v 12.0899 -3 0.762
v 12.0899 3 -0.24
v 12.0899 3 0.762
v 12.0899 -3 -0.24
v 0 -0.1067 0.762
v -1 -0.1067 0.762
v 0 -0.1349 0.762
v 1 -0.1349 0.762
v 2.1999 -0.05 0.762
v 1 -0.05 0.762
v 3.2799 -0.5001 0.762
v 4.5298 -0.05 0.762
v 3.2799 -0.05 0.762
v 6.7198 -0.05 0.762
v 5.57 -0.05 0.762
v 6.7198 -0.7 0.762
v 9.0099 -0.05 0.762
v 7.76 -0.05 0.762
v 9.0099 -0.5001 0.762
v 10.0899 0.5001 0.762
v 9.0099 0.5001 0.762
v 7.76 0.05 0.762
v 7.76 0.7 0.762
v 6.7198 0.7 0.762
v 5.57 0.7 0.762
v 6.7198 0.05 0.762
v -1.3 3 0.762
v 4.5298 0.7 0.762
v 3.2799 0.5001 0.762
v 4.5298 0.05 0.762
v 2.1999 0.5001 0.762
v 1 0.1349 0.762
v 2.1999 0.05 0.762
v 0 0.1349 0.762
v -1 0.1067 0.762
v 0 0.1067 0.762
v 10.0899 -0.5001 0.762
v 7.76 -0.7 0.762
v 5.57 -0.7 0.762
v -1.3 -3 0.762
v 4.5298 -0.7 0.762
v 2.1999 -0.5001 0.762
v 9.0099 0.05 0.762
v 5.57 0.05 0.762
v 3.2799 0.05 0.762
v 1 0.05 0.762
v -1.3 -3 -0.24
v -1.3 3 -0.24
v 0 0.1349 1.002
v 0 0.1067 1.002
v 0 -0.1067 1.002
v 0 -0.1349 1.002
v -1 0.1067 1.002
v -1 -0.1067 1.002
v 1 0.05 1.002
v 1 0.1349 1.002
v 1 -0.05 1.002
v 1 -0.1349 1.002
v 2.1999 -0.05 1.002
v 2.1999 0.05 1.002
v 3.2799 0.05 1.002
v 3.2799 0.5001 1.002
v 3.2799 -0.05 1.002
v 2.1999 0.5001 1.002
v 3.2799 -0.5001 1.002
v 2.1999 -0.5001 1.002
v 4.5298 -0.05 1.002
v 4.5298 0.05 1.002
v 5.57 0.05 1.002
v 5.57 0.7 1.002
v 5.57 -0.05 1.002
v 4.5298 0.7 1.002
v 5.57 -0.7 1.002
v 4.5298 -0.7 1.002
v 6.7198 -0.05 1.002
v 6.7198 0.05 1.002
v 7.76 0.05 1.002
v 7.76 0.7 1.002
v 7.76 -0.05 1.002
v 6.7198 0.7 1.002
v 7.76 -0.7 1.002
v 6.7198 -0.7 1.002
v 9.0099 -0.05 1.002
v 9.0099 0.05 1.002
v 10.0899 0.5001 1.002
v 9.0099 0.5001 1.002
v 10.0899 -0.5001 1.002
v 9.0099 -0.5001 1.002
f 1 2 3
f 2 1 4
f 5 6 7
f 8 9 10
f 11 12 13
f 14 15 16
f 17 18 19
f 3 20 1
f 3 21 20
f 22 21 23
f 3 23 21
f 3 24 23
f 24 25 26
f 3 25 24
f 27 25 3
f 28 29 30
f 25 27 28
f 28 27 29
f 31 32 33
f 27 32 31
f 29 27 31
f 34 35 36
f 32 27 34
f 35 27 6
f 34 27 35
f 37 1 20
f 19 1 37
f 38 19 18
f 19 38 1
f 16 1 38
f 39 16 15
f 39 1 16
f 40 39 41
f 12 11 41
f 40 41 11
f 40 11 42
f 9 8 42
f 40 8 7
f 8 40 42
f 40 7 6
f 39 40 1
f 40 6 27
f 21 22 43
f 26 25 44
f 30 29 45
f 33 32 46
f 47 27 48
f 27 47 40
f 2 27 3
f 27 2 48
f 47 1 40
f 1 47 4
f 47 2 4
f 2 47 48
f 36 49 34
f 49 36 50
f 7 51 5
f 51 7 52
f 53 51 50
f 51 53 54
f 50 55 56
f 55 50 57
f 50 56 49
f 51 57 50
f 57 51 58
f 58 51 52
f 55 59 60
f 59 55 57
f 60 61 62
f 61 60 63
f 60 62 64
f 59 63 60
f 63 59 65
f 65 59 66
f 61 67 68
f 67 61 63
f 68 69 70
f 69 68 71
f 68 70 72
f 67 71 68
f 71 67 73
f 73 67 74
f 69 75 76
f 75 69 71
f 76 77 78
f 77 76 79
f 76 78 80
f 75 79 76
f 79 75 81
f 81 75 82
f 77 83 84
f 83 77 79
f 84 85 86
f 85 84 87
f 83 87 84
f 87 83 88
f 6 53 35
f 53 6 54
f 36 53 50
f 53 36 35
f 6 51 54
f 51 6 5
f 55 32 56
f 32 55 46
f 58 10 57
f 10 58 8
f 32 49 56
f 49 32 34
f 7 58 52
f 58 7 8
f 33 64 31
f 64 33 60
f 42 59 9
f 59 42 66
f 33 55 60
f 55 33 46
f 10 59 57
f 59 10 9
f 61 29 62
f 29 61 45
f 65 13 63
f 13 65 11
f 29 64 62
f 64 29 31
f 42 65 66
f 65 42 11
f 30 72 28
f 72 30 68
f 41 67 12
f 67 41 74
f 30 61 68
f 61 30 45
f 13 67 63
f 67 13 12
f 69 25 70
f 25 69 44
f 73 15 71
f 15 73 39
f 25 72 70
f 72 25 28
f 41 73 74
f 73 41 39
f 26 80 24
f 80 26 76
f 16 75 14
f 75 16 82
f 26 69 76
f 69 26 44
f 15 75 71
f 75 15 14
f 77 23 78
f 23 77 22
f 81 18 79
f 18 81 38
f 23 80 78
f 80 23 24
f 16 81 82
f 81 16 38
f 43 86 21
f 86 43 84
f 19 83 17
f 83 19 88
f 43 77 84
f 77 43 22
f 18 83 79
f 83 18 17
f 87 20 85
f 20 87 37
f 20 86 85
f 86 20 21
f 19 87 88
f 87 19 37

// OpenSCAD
// Models of the microstrip patch antennas used in 05 (units: mm).
// Dimensions: TI SWRU553A Table 7 (mil) and RO3003 5 mil stack-up (Fig. 30).
// Render inside the container objective_hypatia with render_05.sh
// see render_05.sh
model = "series_element";   // "single" | "series_element" (patch_antenna4.series_element, A1 in red) | "series_element_plain" (A1 not marked) | "section" (single patch cut at y = 0 to show the feed port)
zexag = 6;              // exaggeration of the vertical scale (h = 0.127 mm is very thin)
mil = 0.0254;

h   = 0.127 * zexag;    // RO3003 5 mil
tcu = 0.04 * zexag;     // copper 1.6 mil (shown for clarity only; the simulation uses zero thickness)

// TI series-fed array (Table 7)
A1=27.568*mil; A2=11.802*mil; B1=47.24*mil; B2=49.21*mil; B3=45.27*mil; B4=49.21*mil;
C1=42.52*mil;  C2=40.95*mil;  E1=39.38*mil;  E2=55.12*mil;
F1=8.4*mil;    F2=10.62*mil;  F3=3.94*mil;

// textbook single patch (transmission-line model, 77 GHz)
Ws = 1.377; Ls = 1.064;

module cu(x0, x1, w) { translate([x0, -w/2, h]) cube([x1 - x0, w, tcu]); }

module board(x0, x1, gy) {
    color("seagreen", 0.45) translate([x0, -gy/2, 0]) cube([x1 - x0, gy, h]);      // RO3003
    color("dimgray")        translate([x0, -gy/2, -tcu]) cube([x1 - x0, gy, tcu]); // GND (L2)
}

module single() {
    board(-2, 2, 4);
    color("goldenrod") cu(-Ls/2, Ls/2, Ws);
    color("red") translate([0.2, 0, 0]) cylinder(d = 0.12, h = h);                  // lumped port (diameter exaggerated)
}

module series_element() {   // patch_antenna4.series_element
    a1w = (model == "a1_wrong") ? F1 : F2;   // A1 is red: the corrected section (series_element) or the misread one (a1_wrong)
    x = [0, A1, A1+A2, A1+A2+B1, A1+A2+B1+C1, A1+A2+B1+C1+B2,
         A1+A2+B1+C1+B2+C2, A1+A2+B1+C1+B2+C2+B3, A1+A2+B1+C1+B2+C2+B3+C2,
         A1+A2+B1+C1+B2+C2+B3+C2+B4, A1+A2+B1+C1+B2+C2+B3+C2+B4+C1];
    board(-1.3, x[10] + 2, 6);
    color("goldenrod") {
        cu(-1,   x[0], F1);  cu(x[1], x[2], F2);  cu(x[2], x[3], F3);
        cu(x[3], x[4], E1);  cu(x[4], x[5], F3);  cu(x[5], x[6], E2);  cu(x[6], x[7], F3);
        cu(x[7], x[8], E2);  cu(x[8], x[9], F3);  cu(x[9], x[10], E1);
    }
    color(model == "series_element_plain" ? "goldenrod" : "red") cu(x[0], x[1], a1w);          // A1 (red, except in series_element_plain)
    color("red") translate([-1, -F1/2, 0]) cube([0.02, F1, h]);                    // MSL port plane
}

module section() {   // half model (y >= 0), built directly so that the cut faces keep their colors
    color("red")            translate([0.2 - 0.06, 0.01, 0]) cube([0.12, 0.12, h]);   // lumped port (exaggerated)
    color("seagreen", 0.2) translate([-2, 0, 0]) cube([4, 2, h]);
    color("dimgray")        translate([-2, 0, -tcu]) cube([4, 2, tcu]);
    color("goldenrod")      translate([-Ls/2, 0, h]) cube([Ls, Ws/2, tcu]);
}

if (model == "single") single();
else if (model == "section") section();
else series_element();   // "series_element", "series_element_plain" and "a1_wrong"
